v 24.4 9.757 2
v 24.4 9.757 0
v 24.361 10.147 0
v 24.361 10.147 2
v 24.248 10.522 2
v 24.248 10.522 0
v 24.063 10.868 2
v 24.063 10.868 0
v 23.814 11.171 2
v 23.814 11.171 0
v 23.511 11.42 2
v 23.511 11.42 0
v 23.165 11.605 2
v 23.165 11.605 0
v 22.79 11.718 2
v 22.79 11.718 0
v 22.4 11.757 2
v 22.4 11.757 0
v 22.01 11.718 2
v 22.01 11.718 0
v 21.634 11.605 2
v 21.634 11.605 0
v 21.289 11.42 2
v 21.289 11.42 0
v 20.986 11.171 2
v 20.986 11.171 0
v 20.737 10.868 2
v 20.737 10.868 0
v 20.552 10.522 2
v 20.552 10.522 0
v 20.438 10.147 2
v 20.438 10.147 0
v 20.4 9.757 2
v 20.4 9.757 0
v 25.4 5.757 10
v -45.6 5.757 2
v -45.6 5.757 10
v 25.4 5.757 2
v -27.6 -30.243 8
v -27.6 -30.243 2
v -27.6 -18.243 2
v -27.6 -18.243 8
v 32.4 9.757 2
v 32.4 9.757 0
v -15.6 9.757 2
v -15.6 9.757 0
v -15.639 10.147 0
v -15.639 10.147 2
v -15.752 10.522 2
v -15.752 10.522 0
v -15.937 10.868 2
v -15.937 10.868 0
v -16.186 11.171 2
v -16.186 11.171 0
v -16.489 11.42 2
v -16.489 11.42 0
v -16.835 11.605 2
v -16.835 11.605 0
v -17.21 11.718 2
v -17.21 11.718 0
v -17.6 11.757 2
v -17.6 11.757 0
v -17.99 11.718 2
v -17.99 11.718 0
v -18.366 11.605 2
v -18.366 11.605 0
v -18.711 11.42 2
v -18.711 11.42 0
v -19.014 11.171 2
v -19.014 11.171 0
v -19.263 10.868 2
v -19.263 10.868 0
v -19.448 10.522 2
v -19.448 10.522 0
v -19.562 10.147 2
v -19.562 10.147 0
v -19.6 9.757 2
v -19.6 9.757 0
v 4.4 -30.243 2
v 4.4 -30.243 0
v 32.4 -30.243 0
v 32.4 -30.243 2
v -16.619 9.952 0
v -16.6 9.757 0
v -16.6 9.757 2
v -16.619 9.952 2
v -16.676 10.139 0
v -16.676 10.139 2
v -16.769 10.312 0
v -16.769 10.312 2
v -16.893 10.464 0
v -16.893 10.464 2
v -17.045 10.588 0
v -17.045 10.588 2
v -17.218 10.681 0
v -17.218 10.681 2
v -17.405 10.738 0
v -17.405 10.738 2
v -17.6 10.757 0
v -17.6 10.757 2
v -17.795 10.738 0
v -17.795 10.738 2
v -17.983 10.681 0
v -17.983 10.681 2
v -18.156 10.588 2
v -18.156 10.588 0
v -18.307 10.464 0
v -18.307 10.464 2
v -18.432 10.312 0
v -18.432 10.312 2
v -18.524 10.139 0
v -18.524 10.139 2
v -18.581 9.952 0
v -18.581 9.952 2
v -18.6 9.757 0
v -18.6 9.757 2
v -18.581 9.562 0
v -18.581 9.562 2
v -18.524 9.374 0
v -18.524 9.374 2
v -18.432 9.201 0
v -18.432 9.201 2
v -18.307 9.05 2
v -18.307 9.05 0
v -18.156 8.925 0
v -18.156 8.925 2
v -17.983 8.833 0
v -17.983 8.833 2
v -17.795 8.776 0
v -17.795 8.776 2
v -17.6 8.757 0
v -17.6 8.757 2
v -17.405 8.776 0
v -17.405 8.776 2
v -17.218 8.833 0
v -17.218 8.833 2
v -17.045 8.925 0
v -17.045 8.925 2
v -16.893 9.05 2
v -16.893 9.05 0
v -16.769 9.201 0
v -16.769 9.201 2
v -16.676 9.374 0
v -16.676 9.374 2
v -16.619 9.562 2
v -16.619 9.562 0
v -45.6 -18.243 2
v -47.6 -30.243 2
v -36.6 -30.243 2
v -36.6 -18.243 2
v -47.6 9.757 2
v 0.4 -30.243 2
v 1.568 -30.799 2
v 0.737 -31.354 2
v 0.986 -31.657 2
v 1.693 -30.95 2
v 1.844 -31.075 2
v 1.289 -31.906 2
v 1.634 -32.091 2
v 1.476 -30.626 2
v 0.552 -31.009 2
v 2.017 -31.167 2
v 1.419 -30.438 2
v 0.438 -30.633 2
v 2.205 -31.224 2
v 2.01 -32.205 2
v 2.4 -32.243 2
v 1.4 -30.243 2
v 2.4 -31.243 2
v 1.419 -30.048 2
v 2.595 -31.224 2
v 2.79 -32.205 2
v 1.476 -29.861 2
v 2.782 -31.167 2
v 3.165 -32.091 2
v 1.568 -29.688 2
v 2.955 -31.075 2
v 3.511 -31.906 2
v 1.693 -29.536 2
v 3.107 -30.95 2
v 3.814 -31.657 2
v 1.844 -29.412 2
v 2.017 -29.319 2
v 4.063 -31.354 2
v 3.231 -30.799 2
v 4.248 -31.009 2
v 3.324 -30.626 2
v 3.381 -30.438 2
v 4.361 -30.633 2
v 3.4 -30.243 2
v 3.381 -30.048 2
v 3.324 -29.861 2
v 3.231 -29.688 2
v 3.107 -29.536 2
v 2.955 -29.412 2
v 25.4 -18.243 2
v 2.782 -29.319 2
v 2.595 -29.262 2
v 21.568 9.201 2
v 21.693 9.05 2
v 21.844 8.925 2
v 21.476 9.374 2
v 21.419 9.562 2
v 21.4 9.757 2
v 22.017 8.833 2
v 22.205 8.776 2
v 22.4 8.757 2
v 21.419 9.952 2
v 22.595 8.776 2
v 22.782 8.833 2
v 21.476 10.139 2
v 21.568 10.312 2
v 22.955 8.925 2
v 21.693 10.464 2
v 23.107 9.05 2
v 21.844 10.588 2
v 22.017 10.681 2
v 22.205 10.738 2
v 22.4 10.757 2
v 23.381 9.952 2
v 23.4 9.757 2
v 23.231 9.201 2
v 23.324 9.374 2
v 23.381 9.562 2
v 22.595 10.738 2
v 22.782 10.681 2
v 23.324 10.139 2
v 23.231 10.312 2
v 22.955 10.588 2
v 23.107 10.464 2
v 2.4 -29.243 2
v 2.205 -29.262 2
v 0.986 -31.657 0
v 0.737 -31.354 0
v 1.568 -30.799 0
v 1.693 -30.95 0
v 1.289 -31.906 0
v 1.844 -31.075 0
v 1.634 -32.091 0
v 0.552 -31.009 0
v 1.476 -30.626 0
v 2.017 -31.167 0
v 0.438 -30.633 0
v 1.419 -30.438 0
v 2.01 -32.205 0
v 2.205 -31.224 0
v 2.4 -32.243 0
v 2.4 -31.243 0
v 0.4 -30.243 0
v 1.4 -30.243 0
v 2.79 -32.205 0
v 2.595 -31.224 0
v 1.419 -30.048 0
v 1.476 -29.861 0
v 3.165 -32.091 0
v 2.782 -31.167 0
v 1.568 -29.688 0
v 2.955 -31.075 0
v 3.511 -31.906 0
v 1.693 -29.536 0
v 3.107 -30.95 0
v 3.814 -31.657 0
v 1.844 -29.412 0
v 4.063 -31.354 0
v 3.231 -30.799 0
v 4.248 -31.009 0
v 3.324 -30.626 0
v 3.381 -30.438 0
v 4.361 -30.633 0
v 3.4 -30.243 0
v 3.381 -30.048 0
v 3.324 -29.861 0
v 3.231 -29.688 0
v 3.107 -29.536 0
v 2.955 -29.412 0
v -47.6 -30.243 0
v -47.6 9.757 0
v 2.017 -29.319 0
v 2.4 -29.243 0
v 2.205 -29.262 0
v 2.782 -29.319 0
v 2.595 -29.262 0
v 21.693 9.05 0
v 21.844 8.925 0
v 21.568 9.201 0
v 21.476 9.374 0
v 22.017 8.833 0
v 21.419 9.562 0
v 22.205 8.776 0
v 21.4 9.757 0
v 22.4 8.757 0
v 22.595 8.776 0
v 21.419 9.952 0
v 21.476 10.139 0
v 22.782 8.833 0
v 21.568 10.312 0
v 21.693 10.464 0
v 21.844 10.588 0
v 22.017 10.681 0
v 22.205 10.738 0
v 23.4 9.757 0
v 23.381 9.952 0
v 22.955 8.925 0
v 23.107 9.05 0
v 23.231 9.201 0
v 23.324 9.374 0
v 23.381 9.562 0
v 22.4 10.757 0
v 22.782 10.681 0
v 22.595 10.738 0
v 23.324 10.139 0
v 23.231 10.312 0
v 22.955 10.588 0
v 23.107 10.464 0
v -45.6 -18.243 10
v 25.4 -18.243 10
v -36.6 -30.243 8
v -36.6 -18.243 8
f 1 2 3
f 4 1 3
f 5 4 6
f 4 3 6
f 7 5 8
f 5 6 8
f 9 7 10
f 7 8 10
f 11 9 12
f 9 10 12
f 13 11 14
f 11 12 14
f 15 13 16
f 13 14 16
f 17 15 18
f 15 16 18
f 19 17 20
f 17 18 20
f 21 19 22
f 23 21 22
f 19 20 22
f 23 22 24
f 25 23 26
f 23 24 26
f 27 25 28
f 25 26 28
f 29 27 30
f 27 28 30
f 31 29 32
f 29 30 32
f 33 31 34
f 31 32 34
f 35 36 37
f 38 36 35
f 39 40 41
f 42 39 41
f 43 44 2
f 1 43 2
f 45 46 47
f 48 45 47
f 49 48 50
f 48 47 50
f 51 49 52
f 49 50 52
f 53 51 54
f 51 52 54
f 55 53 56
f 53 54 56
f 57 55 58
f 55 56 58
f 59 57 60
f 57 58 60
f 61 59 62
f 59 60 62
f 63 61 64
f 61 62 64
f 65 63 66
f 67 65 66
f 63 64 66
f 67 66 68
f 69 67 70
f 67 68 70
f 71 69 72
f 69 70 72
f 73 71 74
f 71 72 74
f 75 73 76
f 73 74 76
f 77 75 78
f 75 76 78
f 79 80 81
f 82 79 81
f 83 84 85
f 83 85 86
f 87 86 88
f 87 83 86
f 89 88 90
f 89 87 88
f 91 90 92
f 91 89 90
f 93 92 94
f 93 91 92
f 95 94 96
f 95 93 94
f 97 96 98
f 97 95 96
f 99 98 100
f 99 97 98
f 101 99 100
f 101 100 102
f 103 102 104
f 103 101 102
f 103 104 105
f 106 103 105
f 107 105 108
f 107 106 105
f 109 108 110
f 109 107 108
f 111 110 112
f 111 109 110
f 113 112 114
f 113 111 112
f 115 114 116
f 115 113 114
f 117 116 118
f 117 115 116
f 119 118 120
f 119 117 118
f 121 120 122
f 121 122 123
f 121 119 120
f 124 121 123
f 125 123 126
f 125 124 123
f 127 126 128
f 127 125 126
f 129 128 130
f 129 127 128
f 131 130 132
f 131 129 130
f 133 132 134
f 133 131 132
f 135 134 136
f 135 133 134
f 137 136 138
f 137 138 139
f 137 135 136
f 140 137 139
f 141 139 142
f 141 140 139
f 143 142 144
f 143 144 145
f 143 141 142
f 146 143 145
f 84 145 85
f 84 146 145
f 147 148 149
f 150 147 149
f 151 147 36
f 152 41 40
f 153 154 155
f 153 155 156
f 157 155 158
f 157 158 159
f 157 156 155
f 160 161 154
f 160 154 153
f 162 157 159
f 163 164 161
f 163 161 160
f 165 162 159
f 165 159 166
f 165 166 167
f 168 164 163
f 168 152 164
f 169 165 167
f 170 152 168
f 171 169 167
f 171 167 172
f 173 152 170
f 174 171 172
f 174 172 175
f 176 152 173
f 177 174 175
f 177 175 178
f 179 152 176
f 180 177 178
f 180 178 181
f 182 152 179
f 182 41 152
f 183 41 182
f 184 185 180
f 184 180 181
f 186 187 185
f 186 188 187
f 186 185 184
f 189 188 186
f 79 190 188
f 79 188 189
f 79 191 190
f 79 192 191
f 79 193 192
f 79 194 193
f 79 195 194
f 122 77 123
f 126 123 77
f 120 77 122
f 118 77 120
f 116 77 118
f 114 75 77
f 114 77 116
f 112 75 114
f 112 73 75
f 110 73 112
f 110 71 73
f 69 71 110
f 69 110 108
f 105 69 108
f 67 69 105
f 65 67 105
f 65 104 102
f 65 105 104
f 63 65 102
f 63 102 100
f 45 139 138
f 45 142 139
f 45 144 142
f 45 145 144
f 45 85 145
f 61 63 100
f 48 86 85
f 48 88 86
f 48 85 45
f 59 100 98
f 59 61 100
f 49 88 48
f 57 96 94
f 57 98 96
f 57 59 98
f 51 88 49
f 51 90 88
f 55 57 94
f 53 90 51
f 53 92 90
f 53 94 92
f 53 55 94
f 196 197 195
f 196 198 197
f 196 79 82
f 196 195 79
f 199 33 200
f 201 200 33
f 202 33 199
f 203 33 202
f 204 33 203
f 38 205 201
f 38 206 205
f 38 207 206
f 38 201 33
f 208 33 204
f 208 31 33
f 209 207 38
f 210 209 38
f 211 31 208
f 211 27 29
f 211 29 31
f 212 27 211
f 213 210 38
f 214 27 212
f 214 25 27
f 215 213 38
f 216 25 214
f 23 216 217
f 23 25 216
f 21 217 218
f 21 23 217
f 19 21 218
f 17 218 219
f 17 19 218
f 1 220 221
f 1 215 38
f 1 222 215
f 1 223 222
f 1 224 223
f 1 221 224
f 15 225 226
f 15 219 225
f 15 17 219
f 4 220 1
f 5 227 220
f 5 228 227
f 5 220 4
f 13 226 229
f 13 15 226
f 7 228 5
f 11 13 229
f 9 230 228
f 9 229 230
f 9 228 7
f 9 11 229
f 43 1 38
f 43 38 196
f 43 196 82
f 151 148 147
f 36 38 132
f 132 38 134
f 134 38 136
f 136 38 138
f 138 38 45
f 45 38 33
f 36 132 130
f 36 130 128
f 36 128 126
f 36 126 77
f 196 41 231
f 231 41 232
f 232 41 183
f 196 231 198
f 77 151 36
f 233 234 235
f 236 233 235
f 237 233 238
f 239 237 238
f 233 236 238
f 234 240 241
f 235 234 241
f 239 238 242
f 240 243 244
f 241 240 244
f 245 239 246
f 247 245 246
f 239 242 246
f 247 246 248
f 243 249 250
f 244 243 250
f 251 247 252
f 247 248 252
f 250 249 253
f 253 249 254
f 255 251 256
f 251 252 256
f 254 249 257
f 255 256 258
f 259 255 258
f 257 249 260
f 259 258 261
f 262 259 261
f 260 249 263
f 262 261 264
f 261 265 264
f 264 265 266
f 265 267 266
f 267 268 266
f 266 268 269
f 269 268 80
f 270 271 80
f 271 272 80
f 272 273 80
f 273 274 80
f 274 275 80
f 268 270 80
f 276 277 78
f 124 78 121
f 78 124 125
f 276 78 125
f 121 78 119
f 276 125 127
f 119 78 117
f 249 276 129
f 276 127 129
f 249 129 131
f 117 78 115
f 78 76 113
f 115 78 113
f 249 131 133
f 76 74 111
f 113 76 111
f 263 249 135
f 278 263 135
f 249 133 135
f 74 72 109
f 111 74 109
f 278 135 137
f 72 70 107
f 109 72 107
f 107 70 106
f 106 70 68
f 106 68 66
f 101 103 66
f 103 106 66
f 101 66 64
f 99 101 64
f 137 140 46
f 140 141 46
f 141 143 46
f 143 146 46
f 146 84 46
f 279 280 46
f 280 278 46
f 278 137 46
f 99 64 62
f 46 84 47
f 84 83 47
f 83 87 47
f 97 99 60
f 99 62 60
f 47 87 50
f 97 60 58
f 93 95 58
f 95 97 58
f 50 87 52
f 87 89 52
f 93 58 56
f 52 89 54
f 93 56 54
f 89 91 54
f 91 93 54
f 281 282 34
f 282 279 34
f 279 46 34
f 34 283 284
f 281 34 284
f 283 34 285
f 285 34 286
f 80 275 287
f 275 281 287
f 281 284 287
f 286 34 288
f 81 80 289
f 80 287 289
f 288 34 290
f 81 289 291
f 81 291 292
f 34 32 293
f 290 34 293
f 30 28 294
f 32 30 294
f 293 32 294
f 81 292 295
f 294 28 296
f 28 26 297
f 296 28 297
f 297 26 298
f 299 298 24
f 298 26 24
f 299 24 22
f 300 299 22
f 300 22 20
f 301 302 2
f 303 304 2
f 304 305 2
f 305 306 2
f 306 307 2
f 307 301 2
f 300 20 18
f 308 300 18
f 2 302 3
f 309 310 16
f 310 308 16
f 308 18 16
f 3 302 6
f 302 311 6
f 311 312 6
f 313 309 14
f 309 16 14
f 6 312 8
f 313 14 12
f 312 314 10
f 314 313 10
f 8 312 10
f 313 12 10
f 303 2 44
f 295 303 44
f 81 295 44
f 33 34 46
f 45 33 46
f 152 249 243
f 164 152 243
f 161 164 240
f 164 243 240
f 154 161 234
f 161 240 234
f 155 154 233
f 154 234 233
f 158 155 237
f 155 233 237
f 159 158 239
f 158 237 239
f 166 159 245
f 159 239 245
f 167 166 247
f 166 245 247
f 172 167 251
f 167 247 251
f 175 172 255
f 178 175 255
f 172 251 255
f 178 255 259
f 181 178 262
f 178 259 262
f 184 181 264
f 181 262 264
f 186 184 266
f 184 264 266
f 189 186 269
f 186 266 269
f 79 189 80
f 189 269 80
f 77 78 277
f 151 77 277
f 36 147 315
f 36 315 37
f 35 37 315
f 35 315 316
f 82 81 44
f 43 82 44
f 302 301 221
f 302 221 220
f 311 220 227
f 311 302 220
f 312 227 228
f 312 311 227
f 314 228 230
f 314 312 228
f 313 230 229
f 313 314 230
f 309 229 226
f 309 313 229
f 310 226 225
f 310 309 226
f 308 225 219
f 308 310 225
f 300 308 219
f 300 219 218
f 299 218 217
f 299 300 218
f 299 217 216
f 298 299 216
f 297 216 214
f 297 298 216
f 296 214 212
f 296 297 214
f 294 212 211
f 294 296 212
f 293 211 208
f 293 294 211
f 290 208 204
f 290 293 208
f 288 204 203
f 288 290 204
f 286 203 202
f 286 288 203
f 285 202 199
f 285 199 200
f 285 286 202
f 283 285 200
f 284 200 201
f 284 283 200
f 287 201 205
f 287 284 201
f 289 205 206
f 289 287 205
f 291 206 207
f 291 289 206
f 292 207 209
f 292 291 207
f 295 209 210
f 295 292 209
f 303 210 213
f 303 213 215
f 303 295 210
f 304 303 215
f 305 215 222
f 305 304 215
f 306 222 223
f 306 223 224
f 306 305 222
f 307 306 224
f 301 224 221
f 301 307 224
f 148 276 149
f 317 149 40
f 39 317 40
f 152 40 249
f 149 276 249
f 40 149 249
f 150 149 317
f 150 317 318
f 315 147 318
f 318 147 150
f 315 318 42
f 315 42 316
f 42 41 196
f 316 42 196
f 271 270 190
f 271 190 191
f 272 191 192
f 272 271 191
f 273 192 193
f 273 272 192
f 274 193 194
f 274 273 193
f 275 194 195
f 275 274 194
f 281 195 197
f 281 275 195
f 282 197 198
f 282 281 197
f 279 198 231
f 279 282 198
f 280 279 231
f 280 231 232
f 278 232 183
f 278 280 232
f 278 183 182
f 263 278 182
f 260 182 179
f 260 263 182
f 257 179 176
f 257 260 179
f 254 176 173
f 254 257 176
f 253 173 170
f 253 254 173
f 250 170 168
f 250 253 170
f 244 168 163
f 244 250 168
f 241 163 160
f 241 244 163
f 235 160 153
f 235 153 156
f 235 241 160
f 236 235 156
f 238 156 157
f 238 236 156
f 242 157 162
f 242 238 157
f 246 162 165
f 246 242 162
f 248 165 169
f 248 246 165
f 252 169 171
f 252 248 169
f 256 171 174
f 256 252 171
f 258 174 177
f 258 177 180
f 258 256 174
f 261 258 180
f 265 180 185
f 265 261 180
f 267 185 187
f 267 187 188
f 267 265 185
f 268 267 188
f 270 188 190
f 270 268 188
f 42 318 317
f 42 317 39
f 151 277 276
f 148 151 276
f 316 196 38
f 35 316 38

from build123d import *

# Parameters (mm, degrees)
ESQUISSE1_R        = 1
BOSS_EXTRU_1_DEPTH = 2
ESQUISSE2_W        = 71
ESQUISSE2_H        = 24
BOSS_EXTRU_3_DEPTH = 8
ESQUISSE4_W        = 9
ESQUISSE4_H        = 12
BOSS_EXTRU_4_DEPTH = 6


with BuildPart() as part:
    # Esquisse1 → Boss.-Extru.1 (new body)
    with BuildSketch(Plane.XY):
        with BuildLine():
            Line((-47.60021768, -30.24324737), (0.39978232, -30.24324737))
            ThreePointArc((0.39978232, -30.24324737), (2.39978232, -32.24324737), (4.39978232, -30.24324737))
            Line((4.39978232, -30.24324737), (32.39978232, -30.24324737))
            Line((32.39978232, -30.24324737), (32.39978232, 9.75675263))
            Line((32.39978232, 9.75675263), (24.39978232, 9.75675263))
            ThreePointArc((24.39978232, 9.75675263), (22.39978232, 11.75675263), (20.39978232, 9.75675263))
            Line((20.39978232, 9.75675263), (-15.60021768, 9.75675263))
            ThreePointArc((-15.60021768, 9.75675263), (-17.60021768, 11.75675263), (-19.60021768, 9.75675263))
            Line((-19.60021768, 9.75675263), (-47.60021768, 9.75675263))
            Line((-47.60021768, 9.75675263), (-47.60021768, -30.24324737))
        make_face()
        with Locations((22.39978232, 9.75675263)):
            Circle(ESQUISSE1_R, mode=Mode.SUBTRACT)
        with Locations((-17.60021768, 9.75675263)):
            Circle(ESQUISSE1_R, mode=Mode.SUBTRACT)
        with Locations((2.39978232, -30.24324737)):
            Circle(ESQUISSE1_R, mode=Mode.SUBTRACT)
    extrude(amount=BOSS_EXTRU_1_DEPTH)

    # Esquisse2 → Boss.-Extru.3 (add)
    with BuildSketch(Plane.XY.offset(2)):
        with Locations((-10.10021768, -6.24324737)):
            Rectangle(ESQUISSE2_W, ESQUISSE2_H)
    extrude(amount=BOSS_EXTRU_3_DEPTH)

    # Esquisse4 → Boss.-Extru.4 (add)
    with BuildSketch(Plane.XY.offset(2)):
        with Locations((-32.10021768, -24.24324737)):
            Rectangle(ESQUISSE4_W, ESQUISSE4_H)
    extrude(amount=BOSS_EXTRU_4_DEPTH)


solid = part.part
